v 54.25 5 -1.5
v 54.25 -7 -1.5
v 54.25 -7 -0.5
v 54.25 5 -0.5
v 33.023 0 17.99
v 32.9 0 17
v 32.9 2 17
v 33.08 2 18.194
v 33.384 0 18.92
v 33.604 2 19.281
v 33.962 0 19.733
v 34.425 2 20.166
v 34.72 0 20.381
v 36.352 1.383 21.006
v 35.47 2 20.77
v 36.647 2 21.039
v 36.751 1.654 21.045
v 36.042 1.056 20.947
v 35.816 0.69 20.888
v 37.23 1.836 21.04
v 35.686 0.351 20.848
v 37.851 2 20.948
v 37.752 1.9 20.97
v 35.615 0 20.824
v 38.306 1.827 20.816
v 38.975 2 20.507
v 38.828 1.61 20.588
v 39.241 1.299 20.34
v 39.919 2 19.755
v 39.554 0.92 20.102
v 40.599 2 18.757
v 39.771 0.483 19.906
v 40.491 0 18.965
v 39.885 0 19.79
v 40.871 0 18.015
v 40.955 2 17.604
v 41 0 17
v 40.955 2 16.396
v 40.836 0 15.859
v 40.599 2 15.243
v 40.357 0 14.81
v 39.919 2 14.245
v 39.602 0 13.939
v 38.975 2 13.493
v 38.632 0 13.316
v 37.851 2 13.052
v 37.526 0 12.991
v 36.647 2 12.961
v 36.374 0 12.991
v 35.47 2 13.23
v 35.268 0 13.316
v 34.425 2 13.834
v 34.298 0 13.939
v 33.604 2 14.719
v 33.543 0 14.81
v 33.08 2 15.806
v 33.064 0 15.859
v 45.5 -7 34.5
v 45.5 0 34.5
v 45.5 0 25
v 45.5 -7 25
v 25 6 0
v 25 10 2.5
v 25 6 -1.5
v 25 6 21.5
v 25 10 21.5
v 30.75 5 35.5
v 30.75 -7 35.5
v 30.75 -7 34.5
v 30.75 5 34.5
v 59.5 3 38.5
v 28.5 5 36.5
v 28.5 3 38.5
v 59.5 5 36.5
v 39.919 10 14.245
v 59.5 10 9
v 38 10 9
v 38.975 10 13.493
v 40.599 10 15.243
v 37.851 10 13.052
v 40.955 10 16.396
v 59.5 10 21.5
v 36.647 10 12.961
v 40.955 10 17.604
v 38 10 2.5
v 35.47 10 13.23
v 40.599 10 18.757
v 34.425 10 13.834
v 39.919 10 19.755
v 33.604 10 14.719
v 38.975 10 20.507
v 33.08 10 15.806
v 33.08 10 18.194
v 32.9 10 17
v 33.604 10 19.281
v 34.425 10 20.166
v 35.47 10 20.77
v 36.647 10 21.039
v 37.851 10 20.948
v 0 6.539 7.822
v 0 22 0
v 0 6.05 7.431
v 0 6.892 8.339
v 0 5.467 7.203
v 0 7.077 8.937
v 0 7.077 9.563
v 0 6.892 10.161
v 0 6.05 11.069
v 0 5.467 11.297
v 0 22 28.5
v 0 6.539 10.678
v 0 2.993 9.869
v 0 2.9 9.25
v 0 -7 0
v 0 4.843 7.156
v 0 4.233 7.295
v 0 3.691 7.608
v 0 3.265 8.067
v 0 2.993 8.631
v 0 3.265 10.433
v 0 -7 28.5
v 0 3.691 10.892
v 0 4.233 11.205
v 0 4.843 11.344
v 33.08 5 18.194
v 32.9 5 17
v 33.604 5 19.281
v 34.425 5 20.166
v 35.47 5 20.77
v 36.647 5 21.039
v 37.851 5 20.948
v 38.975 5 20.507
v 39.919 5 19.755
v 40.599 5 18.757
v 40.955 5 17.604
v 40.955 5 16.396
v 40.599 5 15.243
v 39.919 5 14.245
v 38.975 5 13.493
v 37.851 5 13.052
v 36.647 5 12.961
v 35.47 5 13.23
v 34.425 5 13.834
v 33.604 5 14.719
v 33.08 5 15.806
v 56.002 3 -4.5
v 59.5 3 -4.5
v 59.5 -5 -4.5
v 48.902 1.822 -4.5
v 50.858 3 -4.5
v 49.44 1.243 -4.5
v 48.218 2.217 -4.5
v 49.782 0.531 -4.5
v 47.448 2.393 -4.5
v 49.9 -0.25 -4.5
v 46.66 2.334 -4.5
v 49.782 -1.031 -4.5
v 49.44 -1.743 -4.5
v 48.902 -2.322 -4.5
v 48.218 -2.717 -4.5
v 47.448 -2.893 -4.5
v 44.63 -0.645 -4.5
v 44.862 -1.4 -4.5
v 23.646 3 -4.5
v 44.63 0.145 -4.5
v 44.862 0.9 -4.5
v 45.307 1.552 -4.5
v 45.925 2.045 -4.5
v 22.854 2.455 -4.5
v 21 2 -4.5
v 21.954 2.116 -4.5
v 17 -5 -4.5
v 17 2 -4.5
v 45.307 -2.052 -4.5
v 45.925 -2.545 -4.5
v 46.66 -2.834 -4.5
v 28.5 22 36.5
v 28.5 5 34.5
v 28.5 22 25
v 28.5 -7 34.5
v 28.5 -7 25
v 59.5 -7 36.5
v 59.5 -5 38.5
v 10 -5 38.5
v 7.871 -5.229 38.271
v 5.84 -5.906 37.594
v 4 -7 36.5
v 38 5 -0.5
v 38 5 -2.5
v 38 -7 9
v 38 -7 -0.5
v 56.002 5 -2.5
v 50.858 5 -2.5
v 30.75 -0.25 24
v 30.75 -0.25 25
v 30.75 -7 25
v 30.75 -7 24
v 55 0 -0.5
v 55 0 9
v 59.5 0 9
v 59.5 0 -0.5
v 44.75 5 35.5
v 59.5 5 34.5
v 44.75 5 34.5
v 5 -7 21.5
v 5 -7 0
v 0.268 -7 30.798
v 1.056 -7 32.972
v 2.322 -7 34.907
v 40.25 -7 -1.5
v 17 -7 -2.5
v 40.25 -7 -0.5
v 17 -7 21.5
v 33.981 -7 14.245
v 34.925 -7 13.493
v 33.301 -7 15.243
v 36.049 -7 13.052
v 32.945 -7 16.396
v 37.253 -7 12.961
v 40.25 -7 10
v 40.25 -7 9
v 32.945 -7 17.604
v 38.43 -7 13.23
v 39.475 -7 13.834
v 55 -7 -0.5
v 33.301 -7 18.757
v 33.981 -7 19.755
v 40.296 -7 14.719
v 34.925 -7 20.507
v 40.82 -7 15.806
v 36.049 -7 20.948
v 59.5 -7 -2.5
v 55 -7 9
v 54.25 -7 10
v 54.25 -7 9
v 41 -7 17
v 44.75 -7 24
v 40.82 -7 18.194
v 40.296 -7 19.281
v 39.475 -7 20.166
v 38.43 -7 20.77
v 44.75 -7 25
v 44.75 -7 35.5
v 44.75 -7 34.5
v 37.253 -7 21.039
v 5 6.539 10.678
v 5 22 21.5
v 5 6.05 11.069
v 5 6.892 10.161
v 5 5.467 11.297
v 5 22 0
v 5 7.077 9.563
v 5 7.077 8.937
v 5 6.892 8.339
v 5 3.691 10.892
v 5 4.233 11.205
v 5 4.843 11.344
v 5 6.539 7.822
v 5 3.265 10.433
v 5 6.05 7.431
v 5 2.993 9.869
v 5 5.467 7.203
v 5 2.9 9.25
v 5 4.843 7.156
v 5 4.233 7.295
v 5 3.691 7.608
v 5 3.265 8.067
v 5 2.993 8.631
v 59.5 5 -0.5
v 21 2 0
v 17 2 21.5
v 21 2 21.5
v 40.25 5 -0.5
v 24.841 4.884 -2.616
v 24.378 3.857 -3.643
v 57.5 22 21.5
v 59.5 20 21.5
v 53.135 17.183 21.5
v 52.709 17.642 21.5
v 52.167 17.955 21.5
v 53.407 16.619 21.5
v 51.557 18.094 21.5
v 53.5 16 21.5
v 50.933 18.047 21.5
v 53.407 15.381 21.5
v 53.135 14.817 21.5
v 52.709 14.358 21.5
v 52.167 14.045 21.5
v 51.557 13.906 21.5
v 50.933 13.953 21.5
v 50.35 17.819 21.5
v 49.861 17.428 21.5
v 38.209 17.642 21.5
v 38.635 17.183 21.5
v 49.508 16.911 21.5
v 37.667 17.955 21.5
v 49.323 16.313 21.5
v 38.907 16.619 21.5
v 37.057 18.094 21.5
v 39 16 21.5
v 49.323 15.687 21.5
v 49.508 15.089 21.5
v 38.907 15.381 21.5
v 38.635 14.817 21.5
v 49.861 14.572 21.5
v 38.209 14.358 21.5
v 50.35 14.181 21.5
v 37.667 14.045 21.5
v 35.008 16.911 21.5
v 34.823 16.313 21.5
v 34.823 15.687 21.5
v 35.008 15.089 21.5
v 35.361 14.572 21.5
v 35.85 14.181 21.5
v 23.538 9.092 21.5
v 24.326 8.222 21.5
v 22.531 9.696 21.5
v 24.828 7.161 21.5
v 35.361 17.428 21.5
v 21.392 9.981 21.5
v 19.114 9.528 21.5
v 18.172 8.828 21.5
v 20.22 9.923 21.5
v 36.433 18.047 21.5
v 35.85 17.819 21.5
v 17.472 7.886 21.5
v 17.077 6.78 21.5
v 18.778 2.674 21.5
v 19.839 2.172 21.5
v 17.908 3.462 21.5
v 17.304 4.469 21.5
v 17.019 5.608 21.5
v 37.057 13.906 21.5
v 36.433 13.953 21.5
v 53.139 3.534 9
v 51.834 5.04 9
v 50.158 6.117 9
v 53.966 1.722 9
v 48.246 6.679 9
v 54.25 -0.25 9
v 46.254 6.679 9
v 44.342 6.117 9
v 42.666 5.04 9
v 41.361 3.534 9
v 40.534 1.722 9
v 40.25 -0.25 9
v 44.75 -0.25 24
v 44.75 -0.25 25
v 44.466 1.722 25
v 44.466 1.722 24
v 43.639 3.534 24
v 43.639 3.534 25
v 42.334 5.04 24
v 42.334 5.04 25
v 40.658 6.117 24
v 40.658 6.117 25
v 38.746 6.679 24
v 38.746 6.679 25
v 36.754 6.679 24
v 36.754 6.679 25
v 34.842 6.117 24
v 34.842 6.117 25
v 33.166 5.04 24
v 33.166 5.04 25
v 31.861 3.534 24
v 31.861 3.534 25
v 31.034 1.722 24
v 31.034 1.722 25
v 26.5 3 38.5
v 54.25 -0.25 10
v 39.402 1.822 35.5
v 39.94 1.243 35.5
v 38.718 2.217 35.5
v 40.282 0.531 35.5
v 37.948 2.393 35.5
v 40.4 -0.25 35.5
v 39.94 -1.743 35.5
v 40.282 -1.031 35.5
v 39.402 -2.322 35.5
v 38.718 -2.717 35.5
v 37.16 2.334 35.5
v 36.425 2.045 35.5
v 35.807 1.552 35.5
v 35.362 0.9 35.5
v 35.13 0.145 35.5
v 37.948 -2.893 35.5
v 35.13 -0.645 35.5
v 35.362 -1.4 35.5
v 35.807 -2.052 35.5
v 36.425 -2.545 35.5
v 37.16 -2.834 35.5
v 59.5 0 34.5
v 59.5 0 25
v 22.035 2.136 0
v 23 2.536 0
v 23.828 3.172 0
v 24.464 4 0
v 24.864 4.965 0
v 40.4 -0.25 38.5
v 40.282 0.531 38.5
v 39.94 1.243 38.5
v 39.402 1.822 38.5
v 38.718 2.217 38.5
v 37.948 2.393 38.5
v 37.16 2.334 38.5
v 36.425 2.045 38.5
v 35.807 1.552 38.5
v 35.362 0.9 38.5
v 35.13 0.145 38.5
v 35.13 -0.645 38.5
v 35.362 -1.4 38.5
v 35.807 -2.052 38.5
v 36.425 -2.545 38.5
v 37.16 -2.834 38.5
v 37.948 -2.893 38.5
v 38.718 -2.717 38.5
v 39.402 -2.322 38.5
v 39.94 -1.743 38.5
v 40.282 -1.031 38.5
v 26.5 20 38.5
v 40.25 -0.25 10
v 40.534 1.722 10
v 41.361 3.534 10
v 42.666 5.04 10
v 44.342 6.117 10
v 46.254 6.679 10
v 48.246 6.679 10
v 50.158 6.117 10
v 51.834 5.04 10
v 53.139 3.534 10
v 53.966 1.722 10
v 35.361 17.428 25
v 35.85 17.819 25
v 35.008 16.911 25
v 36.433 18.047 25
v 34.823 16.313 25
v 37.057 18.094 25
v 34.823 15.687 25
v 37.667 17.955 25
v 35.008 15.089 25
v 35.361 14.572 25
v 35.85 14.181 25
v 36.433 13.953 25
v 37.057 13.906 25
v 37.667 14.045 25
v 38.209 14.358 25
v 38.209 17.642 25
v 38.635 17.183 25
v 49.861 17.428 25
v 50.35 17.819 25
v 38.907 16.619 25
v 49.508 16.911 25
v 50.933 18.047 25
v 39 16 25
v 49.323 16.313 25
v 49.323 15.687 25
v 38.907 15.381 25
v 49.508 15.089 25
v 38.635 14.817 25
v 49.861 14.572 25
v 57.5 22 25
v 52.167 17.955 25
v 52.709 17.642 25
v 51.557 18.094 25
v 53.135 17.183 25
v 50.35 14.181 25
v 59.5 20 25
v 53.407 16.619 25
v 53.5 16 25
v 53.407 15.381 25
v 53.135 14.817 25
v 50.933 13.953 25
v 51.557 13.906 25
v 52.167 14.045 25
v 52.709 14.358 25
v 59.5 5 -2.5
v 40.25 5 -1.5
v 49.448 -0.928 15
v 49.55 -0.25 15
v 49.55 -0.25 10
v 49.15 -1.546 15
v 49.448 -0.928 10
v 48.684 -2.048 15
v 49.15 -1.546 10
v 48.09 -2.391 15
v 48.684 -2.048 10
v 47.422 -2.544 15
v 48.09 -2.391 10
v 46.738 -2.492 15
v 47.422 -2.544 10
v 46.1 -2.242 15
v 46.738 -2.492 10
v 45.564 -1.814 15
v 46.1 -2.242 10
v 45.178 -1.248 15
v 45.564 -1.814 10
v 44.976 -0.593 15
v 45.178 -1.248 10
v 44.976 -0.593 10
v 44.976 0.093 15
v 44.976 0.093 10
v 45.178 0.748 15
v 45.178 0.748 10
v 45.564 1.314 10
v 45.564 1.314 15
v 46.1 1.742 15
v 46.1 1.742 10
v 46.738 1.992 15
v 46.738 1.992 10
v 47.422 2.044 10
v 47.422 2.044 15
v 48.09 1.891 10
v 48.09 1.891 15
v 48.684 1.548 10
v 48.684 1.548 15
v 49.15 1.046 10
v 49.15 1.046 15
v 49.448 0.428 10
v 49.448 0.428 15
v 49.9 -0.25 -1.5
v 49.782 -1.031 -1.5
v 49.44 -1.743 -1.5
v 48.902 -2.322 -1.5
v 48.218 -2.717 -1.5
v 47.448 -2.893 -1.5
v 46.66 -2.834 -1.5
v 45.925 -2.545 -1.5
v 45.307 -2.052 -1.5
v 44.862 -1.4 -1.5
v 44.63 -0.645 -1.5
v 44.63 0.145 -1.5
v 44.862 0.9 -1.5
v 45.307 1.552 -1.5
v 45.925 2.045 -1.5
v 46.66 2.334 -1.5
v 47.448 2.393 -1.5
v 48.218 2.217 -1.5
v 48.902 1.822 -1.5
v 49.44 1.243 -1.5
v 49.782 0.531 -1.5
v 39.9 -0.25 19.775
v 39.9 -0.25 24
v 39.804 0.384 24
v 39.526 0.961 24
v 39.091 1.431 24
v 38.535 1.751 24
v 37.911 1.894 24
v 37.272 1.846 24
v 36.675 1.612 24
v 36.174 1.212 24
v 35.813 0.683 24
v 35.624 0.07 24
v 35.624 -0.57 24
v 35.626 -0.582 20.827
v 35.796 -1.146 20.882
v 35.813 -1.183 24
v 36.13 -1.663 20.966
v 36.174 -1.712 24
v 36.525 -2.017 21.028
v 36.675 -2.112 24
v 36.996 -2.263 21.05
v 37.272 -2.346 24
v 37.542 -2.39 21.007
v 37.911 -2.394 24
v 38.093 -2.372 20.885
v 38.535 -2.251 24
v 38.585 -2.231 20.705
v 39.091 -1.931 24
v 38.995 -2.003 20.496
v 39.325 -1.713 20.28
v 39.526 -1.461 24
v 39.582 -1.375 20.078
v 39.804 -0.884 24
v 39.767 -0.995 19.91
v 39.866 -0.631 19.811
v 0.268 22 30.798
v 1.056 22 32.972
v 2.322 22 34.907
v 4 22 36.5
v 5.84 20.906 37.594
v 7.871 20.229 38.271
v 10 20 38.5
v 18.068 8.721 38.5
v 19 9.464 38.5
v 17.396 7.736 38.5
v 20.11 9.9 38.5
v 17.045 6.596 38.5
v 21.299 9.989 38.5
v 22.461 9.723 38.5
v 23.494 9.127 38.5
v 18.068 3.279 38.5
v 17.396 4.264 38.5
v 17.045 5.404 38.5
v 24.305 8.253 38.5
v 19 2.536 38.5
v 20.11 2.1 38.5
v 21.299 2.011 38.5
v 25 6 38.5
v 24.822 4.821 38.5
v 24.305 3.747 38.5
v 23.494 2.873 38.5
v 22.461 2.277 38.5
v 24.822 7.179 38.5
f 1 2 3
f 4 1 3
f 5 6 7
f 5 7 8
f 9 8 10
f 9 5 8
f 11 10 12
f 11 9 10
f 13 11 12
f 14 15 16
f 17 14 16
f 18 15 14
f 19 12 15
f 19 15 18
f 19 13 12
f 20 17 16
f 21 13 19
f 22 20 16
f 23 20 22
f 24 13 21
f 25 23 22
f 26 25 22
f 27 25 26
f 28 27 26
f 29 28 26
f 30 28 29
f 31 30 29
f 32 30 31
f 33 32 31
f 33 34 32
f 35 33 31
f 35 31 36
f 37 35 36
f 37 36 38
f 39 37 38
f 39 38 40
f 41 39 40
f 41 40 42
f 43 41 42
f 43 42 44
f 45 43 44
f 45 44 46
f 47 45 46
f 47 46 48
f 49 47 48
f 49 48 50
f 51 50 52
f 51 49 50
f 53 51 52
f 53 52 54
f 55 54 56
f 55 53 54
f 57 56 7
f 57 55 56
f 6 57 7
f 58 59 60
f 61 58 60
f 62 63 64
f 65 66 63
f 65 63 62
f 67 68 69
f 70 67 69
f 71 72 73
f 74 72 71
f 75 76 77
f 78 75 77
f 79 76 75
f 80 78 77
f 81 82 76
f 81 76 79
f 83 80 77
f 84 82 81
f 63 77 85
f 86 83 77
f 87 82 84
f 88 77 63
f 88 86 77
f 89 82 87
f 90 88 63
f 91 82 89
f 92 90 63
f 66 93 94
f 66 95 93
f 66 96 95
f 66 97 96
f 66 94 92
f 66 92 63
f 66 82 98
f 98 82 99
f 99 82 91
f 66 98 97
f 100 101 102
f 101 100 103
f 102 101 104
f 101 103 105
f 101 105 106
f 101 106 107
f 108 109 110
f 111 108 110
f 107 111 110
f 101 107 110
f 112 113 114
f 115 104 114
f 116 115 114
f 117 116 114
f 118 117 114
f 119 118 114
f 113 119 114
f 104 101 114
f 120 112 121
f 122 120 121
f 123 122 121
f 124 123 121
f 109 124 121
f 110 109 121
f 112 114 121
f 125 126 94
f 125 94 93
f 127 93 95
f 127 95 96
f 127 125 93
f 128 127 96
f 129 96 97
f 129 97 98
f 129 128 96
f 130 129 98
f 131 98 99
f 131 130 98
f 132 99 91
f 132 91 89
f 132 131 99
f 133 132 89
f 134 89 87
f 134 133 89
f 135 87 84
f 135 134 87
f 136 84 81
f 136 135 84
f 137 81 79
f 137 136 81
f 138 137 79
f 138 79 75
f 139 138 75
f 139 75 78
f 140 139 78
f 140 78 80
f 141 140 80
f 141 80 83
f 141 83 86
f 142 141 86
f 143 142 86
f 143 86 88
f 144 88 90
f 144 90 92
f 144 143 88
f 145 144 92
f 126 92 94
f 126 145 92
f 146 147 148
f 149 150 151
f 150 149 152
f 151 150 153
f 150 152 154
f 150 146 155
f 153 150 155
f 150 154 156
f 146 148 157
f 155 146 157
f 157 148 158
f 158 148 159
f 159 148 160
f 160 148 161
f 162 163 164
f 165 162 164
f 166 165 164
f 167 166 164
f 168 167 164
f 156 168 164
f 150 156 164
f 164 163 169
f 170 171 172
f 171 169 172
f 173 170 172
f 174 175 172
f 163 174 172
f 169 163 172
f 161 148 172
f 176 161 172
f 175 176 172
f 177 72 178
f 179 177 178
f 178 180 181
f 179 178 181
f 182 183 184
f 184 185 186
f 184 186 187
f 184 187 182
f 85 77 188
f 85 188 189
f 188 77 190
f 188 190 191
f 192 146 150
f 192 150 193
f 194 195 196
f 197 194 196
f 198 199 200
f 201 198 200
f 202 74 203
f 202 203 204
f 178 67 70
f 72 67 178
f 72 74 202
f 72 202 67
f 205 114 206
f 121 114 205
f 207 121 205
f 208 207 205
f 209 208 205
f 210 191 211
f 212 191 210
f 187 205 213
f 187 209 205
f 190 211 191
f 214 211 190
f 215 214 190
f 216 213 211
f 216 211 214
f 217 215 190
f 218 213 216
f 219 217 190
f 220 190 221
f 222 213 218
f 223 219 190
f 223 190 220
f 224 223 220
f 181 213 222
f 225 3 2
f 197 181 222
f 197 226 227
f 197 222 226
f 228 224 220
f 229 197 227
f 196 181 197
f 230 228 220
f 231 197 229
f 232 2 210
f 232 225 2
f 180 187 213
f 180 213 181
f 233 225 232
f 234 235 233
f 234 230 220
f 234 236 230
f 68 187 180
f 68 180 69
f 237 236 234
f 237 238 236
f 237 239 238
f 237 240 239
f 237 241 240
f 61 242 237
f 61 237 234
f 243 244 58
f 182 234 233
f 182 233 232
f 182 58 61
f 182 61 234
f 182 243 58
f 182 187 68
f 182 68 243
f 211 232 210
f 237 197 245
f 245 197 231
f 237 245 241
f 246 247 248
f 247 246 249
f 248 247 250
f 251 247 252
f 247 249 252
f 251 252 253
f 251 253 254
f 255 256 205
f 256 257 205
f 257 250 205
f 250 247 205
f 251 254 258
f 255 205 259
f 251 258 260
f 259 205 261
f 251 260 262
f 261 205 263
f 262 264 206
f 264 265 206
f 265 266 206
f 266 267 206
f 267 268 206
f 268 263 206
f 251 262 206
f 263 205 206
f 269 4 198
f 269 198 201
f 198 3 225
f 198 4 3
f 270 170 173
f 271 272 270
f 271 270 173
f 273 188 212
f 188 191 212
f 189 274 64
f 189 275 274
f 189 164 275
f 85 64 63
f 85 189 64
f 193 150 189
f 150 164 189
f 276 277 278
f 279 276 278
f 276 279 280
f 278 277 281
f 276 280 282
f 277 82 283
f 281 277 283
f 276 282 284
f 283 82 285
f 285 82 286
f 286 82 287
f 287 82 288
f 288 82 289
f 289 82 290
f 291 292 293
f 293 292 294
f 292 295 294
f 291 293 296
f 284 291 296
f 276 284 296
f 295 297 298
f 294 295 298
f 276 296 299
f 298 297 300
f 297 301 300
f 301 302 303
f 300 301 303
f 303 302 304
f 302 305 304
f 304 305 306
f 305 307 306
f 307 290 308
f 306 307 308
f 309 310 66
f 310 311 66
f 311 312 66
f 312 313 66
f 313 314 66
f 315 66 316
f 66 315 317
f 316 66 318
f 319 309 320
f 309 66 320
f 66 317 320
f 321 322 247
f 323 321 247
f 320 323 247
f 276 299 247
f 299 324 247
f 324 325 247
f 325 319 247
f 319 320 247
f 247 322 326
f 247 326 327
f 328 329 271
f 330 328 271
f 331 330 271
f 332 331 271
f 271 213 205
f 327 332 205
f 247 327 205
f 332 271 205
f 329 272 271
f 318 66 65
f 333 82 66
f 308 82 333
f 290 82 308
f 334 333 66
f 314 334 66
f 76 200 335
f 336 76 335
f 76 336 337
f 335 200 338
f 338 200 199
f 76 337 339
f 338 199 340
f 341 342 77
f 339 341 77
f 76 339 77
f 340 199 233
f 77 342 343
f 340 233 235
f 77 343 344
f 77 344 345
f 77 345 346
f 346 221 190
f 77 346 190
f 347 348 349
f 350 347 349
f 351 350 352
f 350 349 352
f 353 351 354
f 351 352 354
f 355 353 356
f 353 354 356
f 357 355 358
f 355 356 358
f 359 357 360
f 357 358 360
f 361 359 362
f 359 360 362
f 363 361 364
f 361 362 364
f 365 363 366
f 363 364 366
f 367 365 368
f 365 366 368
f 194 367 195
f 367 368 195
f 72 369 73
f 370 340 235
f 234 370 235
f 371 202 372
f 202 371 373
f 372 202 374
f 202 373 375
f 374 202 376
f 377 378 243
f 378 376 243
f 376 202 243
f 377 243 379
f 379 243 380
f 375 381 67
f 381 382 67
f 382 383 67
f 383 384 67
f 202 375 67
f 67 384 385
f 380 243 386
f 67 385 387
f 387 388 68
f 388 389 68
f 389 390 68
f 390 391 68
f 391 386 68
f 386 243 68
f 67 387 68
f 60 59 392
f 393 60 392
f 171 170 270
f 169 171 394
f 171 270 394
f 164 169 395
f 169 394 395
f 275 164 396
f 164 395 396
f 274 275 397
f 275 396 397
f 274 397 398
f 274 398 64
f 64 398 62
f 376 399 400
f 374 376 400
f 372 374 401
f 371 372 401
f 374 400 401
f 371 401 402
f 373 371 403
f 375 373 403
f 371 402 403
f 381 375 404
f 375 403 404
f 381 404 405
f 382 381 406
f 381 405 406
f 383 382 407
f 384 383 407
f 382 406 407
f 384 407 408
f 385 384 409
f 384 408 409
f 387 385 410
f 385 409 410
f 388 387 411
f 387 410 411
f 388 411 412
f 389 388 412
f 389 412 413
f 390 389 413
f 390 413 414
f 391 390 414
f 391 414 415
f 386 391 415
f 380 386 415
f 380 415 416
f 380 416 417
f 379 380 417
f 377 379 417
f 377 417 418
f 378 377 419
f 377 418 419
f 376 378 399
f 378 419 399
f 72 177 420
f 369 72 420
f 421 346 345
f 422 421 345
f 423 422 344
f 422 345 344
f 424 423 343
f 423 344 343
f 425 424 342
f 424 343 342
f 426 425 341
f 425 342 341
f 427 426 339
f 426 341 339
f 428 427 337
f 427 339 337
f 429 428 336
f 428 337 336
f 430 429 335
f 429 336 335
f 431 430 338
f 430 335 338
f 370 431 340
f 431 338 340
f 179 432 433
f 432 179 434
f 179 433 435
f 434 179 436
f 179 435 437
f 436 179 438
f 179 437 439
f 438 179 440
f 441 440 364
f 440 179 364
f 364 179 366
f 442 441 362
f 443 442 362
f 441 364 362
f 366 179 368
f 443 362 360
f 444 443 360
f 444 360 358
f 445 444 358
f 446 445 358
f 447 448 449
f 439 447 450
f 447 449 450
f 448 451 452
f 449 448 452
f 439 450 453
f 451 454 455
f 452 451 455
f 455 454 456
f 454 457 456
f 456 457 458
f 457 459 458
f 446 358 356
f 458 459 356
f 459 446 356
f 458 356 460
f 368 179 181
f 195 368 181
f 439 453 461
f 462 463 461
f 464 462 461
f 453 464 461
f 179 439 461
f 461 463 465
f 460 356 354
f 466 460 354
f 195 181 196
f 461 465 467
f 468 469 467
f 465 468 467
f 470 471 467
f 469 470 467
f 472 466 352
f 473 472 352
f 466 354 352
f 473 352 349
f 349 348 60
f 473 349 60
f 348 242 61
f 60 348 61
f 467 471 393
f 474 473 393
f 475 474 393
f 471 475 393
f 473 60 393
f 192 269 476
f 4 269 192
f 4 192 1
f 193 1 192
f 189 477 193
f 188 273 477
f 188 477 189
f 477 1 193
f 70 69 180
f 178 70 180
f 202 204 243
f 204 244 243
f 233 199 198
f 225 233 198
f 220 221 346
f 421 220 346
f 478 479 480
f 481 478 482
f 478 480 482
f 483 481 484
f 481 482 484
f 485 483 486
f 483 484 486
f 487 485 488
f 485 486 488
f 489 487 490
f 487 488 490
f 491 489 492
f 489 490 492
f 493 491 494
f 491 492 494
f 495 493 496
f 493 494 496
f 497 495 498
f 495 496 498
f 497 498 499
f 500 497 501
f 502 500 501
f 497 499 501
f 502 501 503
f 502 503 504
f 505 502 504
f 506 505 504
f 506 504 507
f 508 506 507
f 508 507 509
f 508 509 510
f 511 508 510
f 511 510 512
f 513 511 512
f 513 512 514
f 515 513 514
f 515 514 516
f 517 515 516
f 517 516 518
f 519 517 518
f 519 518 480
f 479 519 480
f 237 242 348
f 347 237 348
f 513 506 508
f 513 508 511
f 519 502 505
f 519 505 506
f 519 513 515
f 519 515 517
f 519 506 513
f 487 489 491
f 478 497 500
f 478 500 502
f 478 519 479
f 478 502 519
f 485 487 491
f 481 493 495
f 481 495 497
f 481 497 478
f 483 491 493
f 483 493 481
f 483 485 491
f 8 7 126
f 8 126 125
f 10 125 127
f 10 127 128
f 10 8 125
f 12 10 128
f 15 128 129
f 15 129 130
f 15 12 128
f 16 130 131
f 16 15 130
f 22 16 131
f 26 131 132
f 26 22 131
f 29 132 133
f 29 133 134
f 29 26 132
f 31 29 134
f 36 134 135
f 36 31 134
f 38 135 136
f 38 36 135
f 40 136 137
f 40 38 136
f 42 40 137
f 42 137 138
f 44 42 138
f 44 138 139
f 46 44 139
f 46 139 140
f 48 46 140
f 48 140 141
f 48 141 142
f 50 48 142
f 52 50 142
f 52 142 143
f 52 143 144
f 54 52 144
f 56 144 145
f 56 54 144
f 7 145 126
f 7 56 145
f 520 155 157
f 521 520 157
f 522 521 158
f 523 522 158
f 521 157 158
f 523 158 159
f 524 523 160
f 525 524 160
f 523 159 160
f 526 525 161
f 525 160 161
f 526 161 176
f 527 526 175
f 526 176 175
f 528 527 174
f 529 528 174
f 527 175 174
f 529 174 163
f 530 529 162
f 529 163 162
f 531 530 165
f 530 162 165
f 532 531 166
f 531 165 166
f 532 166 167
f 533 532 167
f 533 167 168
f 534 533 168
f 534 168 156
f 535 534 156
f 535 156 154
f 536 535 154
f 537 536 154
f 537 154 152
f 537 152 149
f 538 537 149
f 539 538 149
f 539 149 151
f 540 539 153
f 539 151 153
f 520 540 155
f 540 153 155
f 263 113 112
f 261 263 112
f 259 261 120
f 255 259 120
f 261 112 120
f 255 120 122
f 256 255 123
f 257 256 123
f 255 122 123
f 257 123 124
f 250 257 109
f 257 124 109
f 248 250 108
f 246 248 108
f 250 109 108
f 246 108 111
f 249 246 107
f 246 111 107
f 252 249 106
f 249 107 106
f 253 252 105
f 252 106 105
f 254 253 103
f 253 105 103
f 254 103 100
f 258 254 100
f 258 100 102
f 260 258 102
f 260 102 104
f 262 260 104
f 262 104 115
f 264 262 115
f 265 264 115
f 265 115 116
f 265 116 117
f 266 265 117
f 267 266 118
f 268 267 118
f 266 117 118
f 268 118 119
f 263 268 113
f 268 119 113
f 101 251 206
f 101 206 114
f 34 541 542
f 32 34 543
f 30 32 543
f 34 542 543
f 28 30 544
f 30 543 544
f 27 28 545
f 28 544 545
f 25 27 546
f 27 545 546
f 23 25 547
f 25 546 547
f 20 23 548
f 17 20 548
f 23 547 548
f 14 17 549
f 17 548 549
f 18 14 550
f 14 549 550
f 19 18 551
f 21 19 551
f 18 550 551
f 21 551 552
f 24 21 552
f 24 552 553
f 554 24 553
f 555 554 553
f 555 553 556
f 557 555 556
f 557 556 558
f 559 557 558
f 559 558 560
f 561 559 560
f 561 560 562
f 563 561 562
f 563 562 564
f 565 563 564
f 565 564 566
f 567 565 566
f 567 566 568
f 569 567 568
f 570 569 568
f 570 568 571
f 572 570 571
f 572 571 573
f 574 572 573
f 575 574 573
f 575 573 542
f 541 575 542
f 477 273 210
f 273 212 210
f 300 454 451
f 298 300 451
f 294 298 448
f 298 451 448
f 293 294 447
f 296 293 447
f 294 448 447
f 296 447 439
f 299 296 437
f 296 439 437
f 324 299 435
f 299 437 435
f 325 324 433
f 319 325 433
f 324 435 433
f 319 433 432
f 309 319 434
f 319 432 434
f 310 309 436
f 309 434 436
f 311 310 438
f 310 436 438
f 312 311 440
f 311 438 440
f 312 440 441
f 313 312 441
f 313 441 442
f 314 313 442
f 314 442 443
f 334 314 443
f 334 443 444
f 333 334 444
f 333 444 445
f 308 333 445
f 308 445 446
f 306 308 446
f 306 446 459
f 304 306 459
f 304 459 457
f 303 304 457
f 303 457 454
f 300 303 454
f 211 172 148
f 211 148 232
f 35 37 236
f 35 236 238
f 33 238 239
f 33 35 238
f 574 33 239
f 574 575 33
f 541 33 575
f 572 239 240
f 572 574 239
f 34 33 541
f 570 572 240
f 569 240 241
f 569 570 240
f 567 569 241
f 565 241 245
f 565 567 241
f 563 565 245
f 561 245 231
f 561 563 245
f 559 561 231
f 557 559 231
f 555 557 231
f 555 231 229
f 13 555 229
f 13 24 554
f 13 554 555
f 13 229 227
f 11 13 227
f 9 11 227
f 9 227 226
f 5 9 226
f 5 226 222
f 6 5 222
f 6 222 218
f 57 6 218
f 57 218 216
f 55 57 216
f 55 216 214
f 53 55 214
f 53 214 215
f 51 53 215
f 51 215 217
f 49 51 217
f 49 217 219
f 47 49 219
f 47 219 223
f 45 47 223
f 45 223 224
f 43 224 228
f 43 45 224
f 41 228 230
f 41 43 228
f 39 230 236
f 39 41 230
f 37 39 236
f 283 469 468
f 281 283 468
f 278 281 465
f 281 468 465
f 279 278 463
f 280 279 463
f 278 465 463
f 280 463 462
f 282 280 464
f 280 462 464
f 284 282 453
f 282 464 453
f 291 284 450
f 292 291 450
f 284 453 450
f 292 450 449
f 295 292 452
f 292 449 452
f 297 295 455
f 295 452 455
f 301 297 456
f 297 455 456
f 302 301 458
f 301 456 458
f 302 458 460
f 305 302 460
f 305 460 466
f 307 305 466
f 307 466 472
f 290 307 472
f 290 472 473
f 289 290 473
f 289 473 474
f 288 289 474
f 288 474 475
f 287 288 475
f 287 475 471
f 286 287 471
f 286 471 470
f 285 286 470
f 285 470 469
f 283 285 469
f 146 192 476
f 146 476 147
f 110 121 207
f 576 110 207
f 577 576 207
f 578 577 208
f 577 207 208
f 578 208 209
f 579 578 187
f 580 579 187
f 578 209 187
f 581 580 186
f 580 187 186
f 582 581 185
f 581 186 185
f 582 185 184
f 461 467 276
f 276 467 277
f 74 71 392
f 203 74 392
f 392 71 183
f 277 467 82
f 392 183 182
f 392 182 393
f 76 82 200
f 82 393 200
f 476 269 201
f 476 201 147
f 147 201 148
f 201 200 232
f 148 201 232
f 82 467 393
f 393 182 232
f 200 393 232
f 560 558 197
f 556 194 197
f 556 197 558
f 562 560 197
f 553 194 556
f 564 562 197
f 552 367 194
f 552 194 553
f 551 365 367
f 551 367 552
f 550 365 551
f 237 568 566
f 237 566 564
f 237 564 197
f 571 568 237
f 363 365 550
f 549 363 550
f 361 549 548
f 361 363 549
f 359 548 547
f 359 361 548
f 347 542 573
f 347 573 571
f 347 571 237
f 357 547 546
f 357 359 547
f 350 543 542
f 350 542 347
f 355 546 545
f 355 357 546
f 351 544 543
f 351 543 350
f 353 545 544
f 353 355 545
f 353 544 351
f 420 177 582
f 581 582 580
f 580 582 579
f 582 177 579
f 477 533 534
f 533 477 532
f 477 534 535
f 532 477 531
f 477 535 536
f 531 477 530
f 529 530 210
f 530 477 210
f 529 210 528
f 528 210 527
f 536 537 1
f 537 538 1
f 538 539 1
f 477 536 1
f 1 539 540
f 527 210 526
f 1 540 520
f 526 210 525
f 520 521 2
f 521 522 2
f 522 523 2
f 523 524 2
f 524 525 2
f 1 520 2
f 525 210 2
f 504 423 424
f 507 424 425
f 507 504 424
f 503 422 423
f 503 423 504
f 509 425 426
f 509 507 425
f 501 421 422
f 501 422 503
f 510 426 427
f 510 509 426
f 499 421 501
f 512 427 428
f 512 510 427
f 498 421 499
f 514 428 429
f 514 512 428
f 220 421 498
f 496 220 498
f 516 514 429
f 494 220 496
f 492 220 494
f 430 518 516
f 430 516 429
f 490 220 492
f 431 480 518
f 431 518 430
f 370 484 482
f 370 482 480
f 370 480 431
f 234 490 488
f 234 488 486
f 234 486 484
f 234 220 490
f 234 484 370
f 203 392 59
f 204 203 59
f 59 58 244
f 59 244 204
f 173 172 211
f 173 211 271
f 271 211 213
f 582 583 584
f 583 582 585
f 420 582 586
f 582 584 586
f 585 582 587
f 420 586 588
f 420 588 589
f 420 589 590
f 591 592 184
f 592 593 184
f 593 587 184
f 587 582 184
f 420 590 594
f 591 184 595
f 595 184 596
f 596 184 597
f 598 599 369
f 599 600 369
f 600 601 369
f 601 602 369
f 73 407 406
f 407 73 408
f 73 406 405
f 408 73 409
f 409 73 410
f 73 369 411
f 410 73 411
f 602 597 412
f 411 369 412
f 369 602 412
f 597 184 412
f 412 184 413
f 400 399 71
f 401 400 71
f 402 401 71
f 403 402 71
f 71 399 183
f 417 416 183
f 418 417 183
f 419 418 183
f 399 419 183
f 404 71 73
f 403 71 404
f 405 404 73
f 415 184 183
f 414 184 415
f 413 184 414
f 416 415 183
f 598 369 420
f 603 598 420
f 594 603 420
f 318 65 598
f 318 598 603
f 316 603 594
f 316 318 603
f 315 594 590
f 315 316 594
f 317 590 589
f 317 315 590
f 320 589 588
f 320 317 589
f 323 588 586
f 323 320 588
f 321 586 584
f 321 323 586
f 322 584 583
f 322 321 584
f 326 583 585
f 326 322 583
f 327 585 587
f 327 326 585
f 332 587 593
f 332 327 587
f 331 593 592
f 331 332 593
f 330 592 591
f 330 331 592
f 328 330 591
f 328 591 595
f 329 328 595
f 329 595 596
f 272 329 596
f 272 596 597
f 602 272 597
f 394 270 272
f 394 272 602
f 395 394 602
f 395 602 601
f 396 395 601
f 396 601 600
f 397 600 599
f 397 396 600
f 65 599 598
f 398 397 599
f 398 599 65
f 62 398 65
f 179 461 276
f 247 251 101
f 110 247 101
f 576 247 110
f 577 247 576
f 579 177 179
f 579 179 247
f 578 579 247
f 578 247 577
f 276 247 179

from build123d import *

# Parameters (mm, degrees)
F0_R           = 4.05
F1_DEPTH       = 7
F2_T1_DEPTH    = 63.387088135
F2_T3_DEPTH    = 52.7867319519
F4_DEPTH       = 22
F6_DEPTH       = 5
F7_R           = 4.05
F8_DEPTH       = 2
F9_R           = 4.05
F10_DEPTH      = 3
F11_R          = 4.05
F12_DEPTH      = 5
F13_T4_DEPTH   = 53.0035618315
F14_SIZE       = 2
F17_DEPTH      = 4
F15_R          = 4
F18_DEPTH      = 4.501
F18_DEPTH_BACK = 38.501
F19_R          = 2.3
F20_DEPTH      = 19.5
F21_R          = 2.65
F21_R_2        = 2.3
F22_DEPTH      = 3
F23_R          = 2.15
F24_DEPTH      = 22
F25_R          = 2.65
F25_R_2        = 2.15
F26_DEPTH      = 3
F28_DEPTH      = 1
F30_DEPTH      = 1
F31_R          = 2.1
F32_DEPTH      = 29.501
F33_T1_DEPTH   = 32.387088135
F33_T3_DEPTH   = 13.7849510361
F33_T8_DEPTH   = 29.2867319519
F34_R          = 2.1
F35_DEPTH      = 5


# Not quite as in the source:
# - a fillet or chamfer that OpenCascade refuses, or shapes differently, is made with other operations: its cross-section is extruded or revolved along the edge and cut away or added


with BuildPart() as f1:
    # F0 (on Front) → F1 (new body)
    with BuildSketch(Plane.XZ):
        with BuildLine():
            Line((0, 28.5), (0, 0))
            Line((0, 0), (5, 0))
            Line((5, 0), (5, 21.5))
            Line((5, 21.5), (17, 21.5))
            Line((17, 21.5), (17, -4.5))
            Line((17, -4.5), (59.5, -4.5))
            Line((59.5, -4.5), (59.5, 38.5))
            Line((59.5, 38.5), (10, 38.5))
            ThreePointArc((10, 38.5), (2.9289321881, 35.5710678119), (0, 28.5))
        make_face()
        Polygon((38, -0.5), (38, 9), (55, 9), (55, -0.5), (54.25, -0.5), (54.25, -1.5), (40.25, -1.5), (40.25, -0.5), align=None, mode=Mode.SUBTRACT)
        with Locations((36.95, 17)):
            Circle(F0_R, mode=Mode.SUBTRACT)
        Polygon((28.5, 25), (28.5, 34.5), (30.75, 34.5), (30.75, 35.5), (44.75, 35.5), (44.75, 34.5), (45.5, 34.5), (45.5, 25), align=None, mode=Mode.SUBTRACT)
    extrude(amount=F1_DEPTH)

    # F2: chamfer of 2 on 2 edges, made by hand

    # F2_s2 → F2_t1 (cut)
    with BuildSketch(Plane.YZ.offset(1.2562778409)):
        Polygon((-5, 38.5), (-7, 36.5), (-7, 38.5), align=None)
    extrude(amount=F2_T1_DEPTH, mode=Mode.SUBTRACT)

    # F2_s4 → F2_t3 (cut)
    with BuildSketch(Plane.YZ.offset(11.8566340241)):
        Polygon((-5, -4.5), (-7, -2.5), (-7, -4.5), align=None)
    extrude(amount=F2_T3_DEPTH, mode=Mode.SUBTRACT)

    # F3 (on face) → F4 (join)
    with BuildSketch(Plane(origin=(0, 0, 0), x_dir=(-1, 0, 0), z_dir=(0, 1, 0))):
        with BuildLine():
            Line((-59.5, 21.5), (-17, 21.5))
            Line((-17, 21.5), (-5, 21.5))
            Line((-5, 21.5), (-5, 0))
            Line((-5, 0), (0, 0))
            Line((0, 0), (0, 28.5))
            ThreePointArc((0, 28.5), (-2.9289321881, 35.5710678119), (-10, 38.5))
            Line((-10, 38.5), (-28.5, 38.5))
            Line((-28.5, 38.5), (-28.5, 34.5))
            Line((-28.5, 34.5), (-28.5, 25))
            Line((-28.5, 25), (-45.5, 25))
            Line((-45.5, 25), (-59.5, 25))
            Line((-59.5, 25), (-59.5, 21.5))
        make_face()
    extrude(amount=F4_DEPTH)

    # F5 (on face) → F6 (join)
    with BuildSketch(Plane(origin=(0, 0, 0), x_dir=(-1, 0, 0), z_dir=(0, 1, 0))):
        Polygon((-30.75, 34.5), (-28.5, 34.5), (-28.5, 38.5), (-59.5, 38.5), (-59.5, 34.5), (-45.5, 34.5), (-44.75, 34.5), (-44.75, 35.5), (-30.75, 35.5), align=None)
    extrude(amount=F6_DEPTH)

    # F7 (on face) → F8 (join)
    with BuildSketch(Plane(origin=(0, 0, 0), x_dir=(-1, 0, 0), z_dir=(0, 1, 0))):
        Polygon((-38, 9), (-38, -0.5), (-40.25, -0.5), (-40.25, -1.5), (-54.25, -1.5), (-54.25, -0.5), (-55, -0.5), (-59.5, -0.5), (-59.5, -4.5), (-17, -4.5), (-17, 21.5), (-59.5, 21.5), (-59.5, 9), (-55, 9), align=None)
        with Locations((-36.95, 17)):
            Circle(F7_R, mode=Mode.SUBTRACT)
    extrude(amount=F8_DEPTH)

    # F9 (on face) → F10 (join)
    with BuildSketch(Plane(origin=(0, 2, 0), x_dir=(-1, 0, 0), z_dir=(0, 1, 0))):
        Polygon((-21, -4.5), (-21, 21.5), (-59.5, 21.5), (-59.5, 9), (-38, 9), (-38, -0.5), (-40.25, -0.5), (-40.25, -1.5), (-54.25, -1.5), (-54.25, -0.5), (-59.5, -0.5), (-59.5, -4.5), align=None)
        with Locations((-36.95, 17)):
            Circle(F9_R, mode=Mode.SUBTRACT)
    extrude(amount=F10_DEPTH)

    # F11 (on face) → F12 (join)
    with BuildSketch(Plane(origin=(0, 5, 0), x_dir=(-1, 0, 0), z_dir=(0, 1, 0))):
        Polygon((-38, 9), (-38, -0.5), (-38, -4.5), (-21, -4.5), (-21, 21.5), (-59.5, 21.5), (-59.5, 9), align=None)
        with Locations((-36.95, 17)):
            Circle(F11_R, mode=Mode.SUBTRACT)
    extrude(amount=F12_DEPTH)

    # F13: chamfer of 7 on 1 edges, made by hand


with BuildPart() as f13_tool2:
    # F13_s3 → F13_t4 (new body)
    with BuildSketch(Plane.YZ.offset(56.0017809158)):
        Polygon((3, -4.5), (10, 2.5), (10, -4.5), align=None)
    extrude(amount=-F13_T4_DEPTH)

    split(bisect_by=Plane.YZ.offset(5), keep=Keep.TOP)


with BuildPart() as f1_1:
    add(f1.part)

    # F13_t1: cut F13_tool2
    add(f13_tool2.part, mode=Mode.SUBTRACT)

    # F14
    f14_edges = [f1_1.edges().sort_by_distance(p)[0] for p in [
        (44, 5, 38.5),
        (59.5, 22, 23.25),
    ]]
    chamfer(f14_edges, length=F14_SIZE)

    # F16 (on face) → F17 (cut)
    with BuildSketch(Plane(origin=(21, 0, 0), x_dir=(0, -1, 0), z_dir=(-1, 0, 0))):
        Polygon((-6, 21.5), (-10, 21.5), (-10, 2.5), (-6, -1.5), align=None)
    extrude(amount=-F17_DEPTH, mode=Mode.SUBTRACT)

    # F15 (on Top) → F18 (cut, two sides)
    with BuildSketch(Plane.XY) as f18_sk:
        with Locations((21, 6)):
            Circle(F15_R)
    extrude(amount=-F18_DEPTH, mode=Mode.SUBTRACT)
    extrude(f18_sk.sketch, amount=F18_DEPTH_BACK, mode=Mode.SUBTRACT)

    # F19 (on face) → F20 (cut)
    with BuildSketch(Plane(origin=(0, 0, -4.5), x_dir=(1, 0, 0), z_dir=(0, 0, -1))):
        with Locations((47.25, 0.25)):
            Circle(F19_R)
    extrude(amount=-F20_DEPTH, mode=Mode.SUBTRACT)

    # F21 (on face) → F22 (cut, through all)
    with BuildSketch(Plane(origin=(0, 0, -4.5), x_dir=(1, 0, 0), z_dir=(0, 0, -1))):
        with Locations((47.25, 0.25)):
            Circle(F21_R)
        with Locations((47.25, 0.25)):
            Circle(F21_R_2, mode=Mode.SUBTRACT)
    extrude(amount=-F22_DEPTH, mode=Mode.SUBTRACT)

    # F23 (on face) → F24 (cut)
    with BuildSketch(Plane.XY.offset(38.5)):
        with Locations((37.75, -0.25)):
            Circle(F23_R)
    extrude(amount=-F24_DEPTH, mode=Mode.SUBTRACT)

    # F25 (on face) → F26 (cut, through all)
    with BuildSketch(Plane.XY.offset(38.5)):
        with Locations((37.75, -0.25)):
            Circle(F25_R)
        with Locations((37.75, -0.25)):
            Circle(F25_R_2, mode=Mode.SUBTRACT)
    extrude(amount=-F26_DEPTH, mode=Mode.SUBTRACT)

    # F27 (on face) → F28 (cut)
    with BuildSketch(Plane.XY.offset(25)):
        with BuildLine():
            ThreePointArc((35.8959503782, -7), (32.1832079546, -4.4939163898), (30.75, -0.25))
            Line((30.75, -0.25), (30.75, -7))
            Line((30.75, -7), (35.8959503782, -7))
        make_face()
        with BuildLine():
            ThreePointArc((39.6040496218, -7), (43.3167920454, -4.4939163898), (44.75, -0.25))
            Line((44.75, -0.25), (39.9, -0.25))
            ThreePointArc((39.9, -0.25), (37.75, -2.4), (35.6, -0.25))
            Line((35.6, -0.25), (30.75, -0.25))
            ThreePointArc((30.75, -0.25), (32.1832079546, -4.4939163898), (35.8959503782, -7))
            Line((35.8959503782, -7), (39.6040496218, -7))
        make_face()
        with BuildLine():
            Line((39.9, -0.25), (44.75, -0.25))
            ThreePointArc((44.75, -0.25), (37.75, 6.75), (30.75, -0.25))
            Line((30.75, -0.25), (35.6, -0.25))
            ThreePointArc((35.6, -0.25), (37.75, 1.9), (39.9, -0.25))
        make_face()
        with BuildLine():
            Line((44.75, -7), (44.75, -0.25))
            ThreePointArc((44.75, -0.25), (43.3167920454, -4.4939163898), (39.6040496218, -7))
            Line((39.6040496218, -7), (44.75, -7))
        make_face()
    extrude(amount=-F28_DEPTH, mode=Mode.SUBTRACT)

    # F29 (on face) → F30 (cut)
    with BuildSketch(Plane(origin=(0, 0, 9), x_dir=(1, 0, 0), z_dir=(0, 0, -1))):
        with BuildLine():
            Line((44.95, 0.25), (40.25, 0.25))
            ThreePointArc((40.25, 0.25), (47.25, -6.75), (54.25, 0.25))
            Line((54.25, 0.25), (49.55, 0.25))
            ThreePointArc((49.55, 0.25), (47.25, -2.05), (44.95, 0.25))
        make_face()
        with BuildLine():
            ThreePointArc((45.3959503782, 7), (41.6832079546, 4.4939163898), (40.25, 0.25))
            Line((40.25, 0.25), (44.95, 0.25))
            ThreePointArc((44.95, 0.25), (47.25, 2.55), (49.55, 0.25))
            Line((49.55, 0.25), (54.25, 0.25))
            ThreePointArc((54.25, 0.25), (52.8167920454, 4.4939163898), (49.1040496218, 7))
            Line((49.1040496218, 7), (45.3959503782, 7))
        make_face()
        with BuildLine():
            Line((40.25, 7), (40.25, 0.25))
            ThreePointArc((40.25, 0.25), (41.6832079546, 4.4939163898), (45.3959503782, 7))
            Line((45.3959503782, 7), (40.25, 7))
        make_face()
        with BuildLine():
            ThreePointArc((49.1040496218, 7), (52.8167920454, 4.4939163898), (54.25, 0.25))
            Line((54.25, 0.25), (54.25, 7))
            Line((54.25, 7), (49.1040496218, 7))
        make_face()
    extrude(amount=-F30_DEPTH, mode=Mode.SUBTRACT)

    # F31 (on face) → F32 (cut, through all)
    with BuildSketch(Plane.XY.offset(25)):
        with Locations((36.9, 16)):
            Circle(F31_R)
        with Locations((51.4, 16)):
            Circle(F31_R)
    extrude(amount=-F32_DEPTH, mode=Mode.SUBTRACT)

    # F33: chamfer of 2 on 3 edges, made by hand

    # F33_s2 → F33_t1 (cut)
    with BuildSketch(Plane.YZ.offset(1.2562778409)):
        Polygon((22, 36.5), (20, 38.5), (22, 38.5), align=None)
    extrude(amount=F33_T1_DEPTH, mode=Mode.SUBTRACT)

    # F33_s4 → F33_t3 (cut)
    with BuildSketch(Plane.YZ.offset(50.8584149398)):
        Polygon((5, -2.5), (3, -4.5), (5, -4.5), align=None)
    extrude(amount=F33_T3_DEPTH, mode=Mode.SUBTRACT)


with BuildPart() as f33_tool6:
    # F33_s7 → F33_t8 (new body)
    with BuildSketch(Plane.XZ.offset(-27.1433659759)):
        Polygon((28.5, 36.5), (26.5, 38.5), (28.5, 38.5), align=None)
    extrude(amount=F33_T8_DEPTH)

    split(bisect_by=Plane(origin=(0, 20.75, 20.75), x_dir=(1, 0, 0), z_dir=(0, 0.7071067812, 0.7071067812)), keep=Keep.TOP)


with BuildPart() as f1_2:
    add(f1_1.part)

    # F33_t5: cut F33_tool6
    add(f33_tool6.part, mode=Mode.SUBTRACT)

    # F34 (on face) → F35 (cut, through all)
    with BuildSketch(Plane(origin=(0, 0, 0), x_dir=(0, -1, 0), z_dir=(-1, 0, 0))):
        with Locations((-5, 9.25)):
            Circle(F34_R)
    extrude(amount=-F35_DEPTH, mode=Mode.SUBTRACT)


solid = f1_2.part
